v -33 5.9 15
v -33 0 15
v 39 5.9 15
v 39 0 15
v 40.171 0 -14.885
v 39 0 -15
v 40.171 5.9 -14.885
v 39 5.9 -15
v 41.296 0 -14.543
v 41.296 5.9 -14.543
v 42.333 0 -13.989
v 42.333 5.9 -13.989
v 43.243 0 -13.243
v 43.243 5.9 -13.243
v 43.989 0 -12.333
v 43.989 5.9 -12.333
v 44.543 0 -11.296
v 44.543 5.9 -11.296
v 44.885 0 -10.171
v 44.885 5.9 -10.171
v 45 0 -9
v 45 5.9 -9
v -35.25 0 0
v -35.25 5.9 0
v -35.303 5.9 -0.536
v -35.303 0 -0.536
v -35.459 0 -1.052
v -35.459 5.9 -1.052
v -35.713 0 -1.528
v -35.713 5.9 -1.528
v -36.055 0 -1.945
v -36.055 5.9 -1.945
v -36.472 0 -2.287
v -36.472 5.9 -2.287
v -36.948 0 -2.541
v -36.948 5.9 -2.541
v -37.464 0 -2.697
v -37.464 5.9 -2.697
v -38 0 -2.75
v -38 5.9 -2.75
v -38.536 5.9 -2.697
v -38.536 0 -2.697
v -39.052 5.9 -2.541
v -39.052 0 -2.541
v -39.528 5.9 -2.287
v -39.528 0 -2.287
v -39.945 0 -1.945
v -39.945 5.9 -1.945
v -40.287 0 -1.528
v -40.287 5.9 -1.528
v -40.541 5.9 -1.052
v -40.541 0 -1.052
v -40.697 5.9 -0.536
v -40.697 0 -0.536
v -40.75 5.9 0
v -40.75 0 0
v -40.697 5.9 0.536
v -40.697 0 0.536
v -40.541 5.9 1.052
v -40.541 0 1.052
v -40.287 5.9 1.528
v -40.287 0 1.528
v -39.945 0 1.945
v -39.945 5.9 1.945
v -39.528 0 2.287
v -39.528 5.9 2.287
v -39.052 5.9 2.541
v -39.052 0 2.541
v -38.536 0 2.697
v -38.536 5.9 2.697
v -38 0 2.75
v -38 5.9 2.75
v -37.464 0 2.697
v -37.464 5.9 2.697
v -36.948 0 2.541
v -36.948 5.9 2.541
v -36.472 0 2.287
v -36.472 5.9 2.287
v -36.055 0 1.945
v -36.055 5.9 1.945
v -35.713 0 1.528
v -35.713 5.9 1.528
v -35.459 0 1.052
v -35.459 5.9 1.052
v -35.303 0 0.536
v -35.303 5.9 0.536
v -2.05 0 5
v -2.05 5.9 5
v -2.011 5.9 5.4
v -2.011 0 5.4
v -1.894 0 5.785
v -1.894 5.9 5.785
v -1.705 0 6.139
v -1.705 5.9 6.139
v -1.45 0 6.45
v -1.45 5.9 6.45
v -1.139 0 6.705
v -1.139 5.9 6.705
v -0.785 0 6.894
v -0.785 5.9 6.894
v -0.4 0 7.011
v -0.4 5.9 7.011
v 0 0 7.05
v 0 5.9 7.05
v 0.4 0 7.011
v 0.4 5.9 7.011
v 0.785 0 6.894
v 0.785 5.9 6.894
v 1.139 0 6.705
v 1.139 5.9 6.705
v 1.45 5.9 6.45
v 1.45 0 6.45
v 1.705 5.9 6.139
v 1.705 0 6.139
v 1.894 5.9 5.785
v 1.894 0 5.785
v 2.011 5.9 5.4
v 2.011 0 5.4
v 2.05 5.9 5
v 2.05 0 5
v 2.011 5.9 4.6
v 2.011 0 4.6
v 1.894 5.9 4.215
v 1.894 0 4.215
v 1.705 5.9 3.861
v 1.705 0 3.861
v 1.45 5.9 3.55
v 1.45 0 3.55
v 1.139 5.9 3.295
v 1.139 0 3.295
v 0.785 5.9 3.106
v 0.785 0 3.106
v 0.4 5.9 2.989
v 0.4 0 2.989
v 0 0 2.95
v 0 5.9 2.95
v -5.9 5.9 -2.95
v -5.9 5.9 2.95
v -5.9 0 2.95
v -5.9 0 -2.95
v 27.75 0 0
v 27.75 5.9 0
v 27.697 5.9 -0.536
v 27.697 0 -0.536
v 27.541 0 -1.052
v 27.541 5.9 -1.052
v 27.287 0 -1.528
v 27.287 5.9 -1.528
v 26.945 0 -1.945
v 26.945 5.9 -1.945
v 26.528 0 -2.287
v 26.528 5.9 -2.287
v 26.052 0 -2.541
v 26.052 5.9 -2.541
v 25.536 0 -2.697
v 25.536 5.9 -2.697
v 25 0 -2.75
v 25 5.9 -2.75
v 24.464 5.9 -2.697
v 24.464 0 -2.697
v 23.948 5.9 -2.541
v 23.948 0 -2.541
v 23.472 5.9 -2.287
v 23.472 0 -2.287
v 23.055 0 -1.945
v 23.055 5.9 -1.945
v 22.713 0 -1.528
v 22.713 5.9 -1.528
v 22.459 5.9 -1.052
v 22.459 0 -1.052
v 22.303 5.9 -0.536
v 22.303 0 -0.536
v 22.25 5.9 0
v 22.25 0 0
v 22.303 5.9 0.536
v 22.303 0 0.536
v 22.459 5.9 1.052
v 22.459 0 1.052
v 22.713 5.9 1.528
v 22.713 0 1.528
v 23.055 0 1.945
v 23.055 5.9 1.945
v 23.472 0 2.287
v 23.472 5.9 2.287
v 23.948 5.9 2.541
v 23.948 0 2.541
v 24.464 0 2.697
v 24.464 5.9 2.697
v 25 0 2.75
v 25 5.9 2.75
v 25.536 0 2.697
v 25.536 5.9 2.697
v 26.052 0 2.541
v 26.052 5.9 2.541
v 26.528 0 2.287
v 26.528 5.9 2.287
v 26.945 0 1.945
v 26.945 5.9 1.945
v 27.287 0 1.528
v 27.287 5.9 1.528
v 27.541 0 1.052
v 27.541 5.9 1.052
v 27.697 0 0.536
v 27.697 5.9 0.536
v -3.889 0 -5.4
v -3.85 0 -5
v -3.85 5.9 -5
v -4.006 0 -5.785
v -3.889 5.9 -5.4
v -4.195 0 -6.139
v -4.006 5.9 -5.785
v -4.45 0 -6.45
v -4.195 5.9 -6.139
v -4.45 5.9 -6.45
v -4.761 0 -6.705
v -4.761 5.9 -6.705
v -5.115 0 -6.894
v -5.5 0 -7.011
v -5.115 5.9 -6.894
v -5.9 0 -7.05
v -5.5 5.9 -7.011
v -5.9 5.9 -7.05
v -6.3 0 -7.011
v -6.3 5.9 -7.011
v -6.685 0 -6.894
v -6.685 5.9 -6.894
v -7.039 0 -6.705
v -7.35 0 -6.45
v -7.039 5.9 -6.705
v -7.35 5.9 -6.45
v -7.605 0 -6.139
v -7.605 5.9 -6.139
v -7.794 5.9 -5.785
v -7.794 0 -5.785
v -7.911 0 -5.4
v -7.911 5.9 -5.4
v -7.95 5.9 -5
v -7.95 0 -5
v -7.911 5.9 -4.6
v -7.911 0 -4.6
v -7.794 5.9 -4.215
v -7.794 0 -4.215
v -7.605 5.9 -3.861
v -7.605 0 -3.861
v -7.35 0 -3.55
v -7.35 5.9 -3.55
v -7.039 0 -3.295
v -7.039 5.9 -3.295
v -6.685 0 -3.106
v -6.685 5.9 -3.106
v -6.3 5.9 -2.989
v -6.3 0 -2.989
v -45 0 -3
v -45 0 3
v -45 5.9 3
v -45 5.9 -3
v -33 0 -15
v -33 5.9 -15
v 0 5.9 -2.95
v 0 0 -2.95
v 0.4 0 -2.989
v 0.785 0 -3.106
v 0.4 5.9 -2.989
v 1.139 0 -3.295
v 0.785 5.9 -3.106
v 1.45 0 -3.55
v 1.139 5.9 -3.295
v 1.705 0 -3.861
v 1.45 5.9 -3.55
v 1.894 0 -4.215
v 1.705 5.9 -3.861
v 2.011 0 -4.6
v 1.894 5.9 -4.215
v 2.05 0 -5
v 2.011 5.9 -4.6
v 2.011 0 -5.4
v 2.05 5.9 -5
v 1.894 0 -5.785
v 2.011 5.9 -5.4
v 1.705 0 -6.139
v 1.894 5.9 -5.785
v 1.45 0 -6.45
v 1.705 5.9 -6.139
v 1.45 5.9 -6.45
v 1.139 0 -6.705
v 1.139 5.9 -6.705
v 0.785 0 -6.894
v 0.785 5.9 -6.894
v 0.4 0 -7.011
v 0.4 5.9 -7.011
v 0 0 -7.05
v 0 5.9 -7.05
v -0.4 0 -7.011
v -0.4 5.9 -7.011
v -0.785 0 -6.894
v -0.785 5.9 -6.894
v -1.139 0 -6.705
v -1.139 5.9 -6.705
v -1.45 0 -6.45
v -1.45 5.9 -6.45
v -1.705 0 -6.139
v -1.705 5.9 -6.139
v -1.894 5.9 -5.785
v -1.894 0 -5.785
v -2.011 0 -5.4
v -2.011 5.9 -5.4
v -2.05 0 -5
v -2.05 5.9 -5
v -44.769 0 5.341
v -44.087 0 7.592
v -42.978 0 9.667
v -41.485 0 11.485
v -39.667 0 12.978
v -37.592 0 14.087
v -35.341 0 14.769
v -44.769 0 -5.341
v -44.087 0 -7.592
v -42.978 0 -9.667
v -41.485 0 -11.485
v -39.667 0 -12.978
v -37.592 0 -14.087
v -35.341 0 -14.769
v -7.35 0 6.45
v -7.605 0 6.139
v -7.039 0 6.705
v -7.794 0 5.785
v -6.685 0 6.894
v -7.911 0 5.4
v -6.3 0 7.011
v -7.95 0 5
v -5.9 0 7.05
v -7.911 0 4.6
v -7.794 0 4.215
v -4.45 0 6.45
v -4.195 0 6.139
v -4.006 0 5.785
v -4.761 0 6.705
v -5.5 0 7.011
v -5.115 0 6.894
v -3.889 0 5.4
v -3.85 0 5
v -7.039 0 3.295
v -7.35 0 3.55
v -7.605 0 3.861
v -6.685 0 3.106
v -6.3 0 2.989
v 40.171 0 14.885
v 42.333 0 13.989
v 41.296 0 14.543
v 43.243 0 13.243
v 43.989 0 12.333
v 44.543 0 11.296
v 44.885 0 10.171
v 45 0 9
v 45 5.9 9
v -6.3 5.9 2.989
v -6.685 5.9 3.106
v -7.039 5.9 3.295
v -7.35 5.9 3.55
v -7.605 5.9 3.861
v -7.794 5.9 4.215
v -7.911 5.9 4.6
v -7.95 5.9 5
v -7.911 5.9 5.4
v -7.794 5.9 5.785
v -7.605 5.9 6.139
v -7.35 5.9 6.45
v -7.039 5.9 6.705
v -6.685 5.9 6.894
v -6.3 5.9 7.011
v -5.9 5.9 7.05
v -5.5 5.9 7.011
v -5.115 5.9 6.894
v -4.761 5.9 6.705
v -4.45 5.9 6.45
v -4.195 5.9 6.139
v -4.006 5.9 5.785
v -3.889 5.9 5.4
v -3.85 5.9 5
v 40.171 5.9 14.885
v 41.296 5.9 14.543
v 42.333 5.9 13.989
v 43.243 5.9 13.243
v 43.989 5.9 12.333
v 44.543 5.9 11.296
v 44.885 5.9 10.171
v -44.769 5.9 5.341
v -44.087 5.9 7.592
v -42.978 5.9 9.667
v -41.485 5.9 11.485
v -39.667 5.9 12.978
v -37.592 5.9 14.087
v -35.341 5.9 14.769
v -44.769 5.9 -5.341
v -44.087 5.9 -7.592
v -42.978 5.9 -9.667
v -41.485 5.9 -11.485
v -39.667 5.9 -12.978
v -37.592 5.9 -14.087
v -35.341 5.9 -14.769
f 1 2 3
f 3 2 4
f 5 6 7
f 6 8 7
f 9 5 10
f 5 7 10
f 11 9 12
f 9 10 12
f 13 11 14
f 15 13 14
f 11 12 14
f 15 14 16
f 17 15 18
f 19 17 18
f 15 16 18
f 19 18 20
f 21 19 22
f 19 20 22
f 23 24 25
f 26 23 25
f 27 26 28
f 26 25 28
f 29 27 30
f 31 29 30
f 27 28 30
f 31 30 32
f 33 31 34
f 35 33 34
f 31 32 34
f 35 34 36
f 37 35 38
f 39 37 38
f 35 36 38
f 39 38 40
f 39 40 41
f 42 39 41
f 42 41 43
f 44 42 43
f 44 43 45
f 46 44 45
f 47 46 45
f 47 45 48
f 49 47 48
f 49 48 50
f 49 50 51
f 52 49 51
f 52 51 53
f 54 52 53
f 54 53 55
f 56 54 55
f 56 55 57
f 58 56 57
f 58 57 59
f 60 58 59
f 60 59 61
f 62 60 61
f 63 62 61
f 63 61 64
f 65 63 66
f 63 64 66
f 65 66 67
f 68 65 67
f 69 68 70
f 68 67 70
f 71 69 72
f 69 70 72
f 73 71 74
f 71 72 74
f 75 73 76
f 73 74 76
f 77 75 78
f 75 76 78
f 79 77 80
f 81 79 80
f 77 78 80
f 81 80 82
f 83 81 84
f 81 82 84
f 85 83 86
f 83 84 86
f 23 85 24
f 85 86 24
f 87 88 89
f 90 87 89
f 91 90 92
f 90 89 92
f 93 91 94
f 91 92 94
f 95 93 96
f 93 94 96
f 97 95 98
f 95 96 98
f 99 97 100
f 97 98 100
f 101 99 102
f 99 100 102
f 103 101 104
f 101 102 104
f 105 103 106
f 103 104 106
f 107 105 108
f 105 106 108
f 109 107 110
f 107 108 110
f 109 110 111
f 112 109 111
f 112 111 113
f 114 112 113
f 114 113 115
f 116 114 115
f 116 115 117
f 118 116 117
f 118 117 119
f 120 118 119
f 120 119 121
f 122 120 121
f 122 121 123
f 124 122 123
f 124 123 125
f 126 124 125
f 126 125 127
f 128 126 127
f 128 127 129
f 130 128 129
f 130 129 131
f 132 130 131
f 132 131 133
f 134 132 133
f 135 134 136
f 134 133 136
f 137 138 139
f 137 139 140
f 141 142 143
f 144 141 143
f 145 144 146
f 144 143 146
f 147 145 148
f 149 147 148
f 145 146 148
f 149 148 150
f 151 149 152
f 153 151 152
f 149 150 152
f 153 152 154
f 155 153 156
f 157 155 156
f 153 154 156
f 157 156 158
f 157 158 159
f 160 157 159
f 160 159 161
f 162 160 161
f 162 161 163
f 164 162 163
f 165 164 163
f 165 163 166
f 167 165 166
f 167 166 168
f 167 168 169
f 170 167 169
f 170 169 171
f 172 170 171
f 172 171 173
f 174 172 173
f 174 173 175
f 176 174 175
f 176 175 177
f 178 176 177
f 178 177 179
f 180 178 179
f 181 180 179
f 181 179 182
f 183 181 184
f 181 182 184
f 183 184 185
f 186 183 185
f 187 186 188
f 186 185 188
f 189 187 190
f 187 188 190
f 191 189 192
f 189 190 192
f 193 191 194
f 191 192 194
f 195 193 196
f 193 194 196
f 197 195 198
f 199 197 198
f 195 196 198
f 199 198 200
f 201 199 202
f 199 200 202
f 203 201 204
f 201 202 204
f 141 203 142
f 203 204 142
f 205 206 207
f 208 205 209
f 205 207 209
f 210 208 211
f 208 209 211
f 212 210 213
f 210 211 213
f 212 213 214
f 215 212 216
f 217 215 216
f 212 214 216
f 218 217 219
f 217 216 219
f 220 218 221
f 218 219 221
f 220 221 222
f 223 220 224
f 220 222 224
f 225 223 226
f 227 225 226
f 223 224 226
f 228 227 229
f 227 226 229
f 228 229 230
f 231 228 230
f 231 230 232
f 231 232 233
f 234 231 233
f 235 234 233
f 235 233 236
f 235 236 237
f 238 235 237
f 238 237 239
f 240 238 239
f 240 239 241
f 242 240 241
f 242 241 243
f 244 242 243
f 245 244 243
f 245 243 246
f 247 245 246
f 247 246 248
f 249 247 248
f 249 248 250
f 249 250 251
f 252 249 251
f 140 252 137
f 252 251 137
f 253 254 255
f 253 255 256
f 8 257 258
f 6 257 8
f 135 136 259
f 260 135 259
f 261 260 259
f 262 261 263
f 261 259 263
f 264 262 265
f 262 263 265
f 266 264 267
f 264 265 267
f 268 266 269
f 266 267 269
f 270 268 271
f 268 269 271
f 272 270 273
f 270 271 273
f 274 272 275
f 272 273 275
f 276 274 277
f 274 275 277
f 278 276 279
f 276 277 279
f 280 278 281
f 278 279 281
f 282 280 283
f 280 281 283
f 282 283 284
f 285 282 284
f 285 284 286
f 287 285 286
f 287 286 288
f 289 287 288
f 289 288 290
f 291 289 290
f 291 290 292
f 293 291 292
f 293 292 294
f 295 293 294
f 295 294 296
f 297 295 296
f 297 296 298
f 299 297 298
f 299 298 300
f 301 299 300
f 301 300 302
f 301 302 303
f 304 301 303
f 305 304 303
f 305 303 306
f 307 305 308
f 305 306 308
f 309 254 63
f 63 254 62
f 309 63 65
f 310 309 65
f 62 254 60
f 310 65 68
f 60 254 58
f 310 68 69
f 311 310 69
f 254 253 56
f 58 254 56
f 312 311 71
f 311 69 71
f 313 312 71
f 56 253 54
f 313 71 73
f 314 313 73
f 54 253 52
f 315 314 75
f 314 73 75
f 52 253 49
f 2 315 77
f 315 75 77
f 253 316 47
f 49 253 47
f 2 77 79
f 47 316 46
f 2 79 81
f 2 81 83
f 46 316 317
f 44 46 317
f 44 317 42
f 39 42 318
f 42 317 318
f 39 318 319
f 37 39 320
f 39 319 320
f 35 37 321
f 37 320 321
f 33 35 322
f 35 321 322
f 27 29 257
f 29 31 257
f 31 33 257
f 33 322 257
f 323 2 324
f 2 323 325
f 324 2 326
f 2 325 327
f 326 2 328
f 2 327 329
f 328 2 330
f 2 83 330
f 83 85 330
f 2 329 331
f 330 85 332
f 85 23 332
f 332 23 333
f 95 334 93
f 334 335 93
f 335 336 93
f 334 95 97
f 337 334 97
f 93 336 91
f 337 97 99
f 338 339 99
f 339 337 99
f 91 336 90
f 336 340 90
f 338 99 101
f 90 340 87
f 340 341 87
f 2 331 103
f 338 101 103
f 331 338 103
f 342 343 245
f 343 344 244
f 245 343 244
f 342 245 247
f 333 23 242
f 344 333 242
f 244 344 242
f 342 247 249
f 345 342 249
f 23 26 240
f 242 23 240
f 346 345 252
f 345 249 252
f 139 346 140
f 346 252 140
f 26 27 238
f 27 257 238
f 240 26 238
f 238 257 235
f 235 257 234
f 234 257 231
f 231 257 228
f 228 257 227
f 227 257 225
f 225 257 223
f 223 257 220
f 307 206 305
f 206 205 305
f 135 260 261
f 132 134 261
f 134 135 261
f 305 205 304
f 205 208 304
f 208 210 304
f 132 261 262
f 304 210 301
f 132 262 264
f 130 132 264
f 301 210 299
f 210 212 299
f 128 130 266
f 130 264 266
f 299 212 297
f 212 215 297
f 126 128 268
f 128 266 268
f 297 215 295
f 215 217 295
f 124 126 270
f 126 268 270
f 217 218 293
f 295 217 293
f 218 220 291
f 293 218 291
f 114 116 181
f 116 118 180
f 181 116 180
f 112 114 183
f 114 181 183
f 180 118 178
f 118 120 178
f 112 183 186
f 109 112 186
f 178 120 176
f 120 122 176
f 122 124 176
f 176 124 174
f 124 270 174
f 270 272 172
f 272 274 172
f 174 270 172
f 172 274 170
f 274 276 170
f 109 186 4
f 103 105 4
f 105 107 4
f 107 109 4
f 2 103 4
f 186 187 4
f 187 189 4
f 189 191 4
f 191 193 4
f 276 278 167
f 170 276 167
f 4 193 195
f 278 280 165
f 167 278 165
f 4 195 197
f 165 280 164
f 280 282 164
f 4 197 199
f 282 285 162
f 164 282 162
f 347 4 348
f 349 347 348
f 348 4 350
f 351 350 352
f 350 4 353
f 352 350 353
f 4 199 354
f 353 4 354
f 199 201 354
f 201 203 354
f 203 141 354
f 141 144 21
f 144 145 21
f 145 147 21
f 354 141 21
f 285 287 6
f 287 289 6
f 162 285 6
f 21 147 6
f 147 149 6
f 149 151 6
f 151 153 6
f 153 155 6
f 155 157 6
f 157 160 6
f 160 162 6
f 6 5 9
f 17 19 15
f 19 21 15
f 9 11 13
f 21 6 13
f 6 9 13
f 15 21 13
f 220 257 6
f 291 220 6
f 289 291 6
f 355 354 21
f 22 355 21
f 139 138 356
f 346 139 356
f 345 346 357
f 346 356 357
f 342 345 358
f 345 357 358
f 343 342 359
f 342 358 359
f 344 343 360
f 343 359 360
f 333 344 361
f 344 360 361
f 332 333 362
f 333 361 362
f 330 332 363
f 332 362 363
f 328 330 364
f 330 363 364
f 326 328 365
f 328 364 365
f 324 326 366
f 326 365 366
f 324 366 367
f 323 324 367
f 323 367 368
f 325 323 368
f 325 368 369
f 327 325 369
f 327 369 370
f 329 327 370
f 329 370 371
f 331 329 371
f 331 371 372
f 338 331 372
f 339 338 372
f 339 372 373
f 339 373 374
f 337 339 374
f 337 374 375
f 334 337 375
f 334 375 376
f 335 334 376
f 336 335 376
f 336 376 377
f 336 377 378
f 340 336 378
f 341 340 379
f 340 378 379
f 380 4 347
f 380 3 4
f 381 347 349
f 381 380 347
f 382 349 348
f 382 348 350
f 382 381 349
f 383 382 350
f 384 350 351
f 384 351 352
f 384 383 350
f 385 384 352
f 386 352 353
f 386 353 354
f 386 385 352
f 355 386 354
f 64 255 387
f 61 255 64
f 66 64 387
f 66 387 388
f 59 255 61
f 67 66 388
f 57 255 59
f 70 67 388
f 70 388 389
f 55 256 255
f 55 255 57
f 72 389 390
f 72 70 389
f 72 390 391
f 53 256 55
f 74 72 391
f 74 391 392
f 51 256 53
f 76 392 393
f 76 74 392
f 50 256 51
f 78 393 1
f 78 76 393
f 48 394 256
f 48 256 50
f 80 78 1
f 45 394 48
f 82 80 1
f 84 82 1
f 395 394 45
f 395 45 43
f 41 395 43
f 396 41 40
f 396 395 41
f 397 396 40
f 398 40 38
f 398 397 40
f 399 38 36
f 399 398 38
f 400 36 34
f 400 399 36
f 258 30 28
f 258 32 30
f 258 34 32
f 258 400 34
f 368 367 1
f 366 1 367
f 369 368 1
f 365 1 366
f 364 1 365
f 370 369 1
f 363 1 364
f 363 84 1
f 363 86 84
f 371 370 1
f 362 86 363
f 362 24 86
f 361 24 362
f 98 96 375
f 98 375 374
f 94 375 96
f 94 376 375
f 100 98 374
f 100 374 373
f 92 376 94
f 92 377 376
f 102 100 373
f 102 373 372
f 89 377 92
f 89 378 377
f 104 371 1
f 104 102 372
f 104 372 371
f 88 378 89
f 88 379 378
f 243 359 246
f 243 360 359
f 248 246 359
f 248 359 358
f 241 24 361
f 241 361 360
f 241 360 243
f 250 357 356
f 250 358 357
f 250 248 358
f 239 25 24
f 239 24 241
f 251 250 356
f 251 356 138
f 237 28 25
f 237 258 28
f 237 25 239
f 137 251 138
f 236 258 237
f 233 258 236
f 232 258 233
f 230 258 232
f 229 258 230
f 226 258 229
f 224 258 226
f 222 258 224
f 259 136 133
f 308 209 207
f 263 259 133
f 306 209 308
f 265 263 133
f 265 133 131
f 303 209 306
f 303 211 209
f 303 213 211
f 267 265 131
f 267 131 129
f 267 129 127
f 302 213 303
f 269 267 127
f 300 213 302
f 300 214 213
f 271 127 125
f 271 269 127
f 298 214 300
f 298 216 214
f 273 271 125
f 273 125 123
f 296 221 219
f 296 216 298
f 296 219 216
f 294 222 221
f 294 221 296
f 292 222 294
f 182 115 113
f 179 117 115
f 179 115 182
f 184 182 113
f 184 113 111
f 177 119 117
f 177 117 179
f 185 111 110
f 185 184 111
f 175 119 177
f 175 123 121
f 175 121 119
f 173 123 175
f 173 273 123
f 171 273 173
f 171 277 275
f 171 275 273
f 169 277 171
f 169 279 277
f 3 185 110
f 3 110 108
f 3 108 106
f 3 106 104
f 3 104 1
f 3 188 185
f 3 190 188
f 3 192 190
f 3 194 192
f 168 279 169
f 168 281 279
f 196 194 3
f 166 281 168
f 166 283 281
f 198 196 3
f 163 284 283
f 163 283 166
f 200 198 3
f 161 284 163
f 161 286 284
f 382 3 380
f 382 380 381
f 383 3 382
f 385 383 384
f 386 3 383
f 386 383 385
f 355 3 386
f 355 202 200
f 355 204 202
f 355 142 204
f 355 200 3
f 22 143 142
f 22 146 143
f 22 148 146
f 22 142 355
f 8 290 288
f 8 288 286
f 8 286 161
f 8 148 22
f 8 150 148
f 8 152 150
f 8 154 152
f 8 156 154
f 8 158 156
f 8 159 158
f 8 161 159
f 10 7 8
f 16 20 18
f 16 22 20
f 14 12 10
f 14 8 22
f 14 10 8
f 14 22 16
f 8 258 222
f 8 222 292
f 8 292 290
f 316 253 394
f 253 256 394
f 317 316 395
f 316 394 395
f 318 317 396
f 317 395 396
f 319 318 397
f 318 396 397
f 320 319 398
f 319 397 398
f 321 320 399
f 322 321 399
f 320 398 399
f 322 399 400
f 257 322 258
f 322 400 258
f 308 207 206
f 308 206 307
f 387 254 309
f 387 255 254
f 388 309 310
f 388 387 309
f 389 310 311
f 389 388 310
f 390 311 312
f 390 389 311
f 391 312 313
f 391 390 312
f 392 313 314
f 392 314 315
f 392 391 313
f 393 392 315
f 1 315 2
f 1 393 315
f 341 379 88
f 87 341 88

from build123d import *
from OCP.BRepFilletAPI import BRepFilletAPI_MakeFillet

# Parameters (mm, degrees)
SKETCH1_W           = 90
SKETCH1_H           = 30
BOSS_EXTRUDE1_DEPTH = 5.9
SKETCH2_R           = 2.75
CUT_EXTRUDE1_DEPTH  = 10
SKETCH3_W           = 5.9
SKETCH3_H           = 10
CUT_EXTRUDE2_DEPTH  = 10
CUT_EXTRUDE5_REACH  = 49.8
SKETCH6_R           = 2.05
FILLET1_R1          = 12
FILLET1_R2          = 6


with BuildPart() as part:
    # Sketch1 → Boss-Extrude1 (new body)
    with BuildSketch(Plane(origin=(0, 0, 0), x_dir=(1, 0, 0), z_dir=(0, 1, 0))):
        Rectangle(SKETCH1_W, SKETCH1_H)
    extrude(amount=BOSS_EXTRUDE1_DEPTH)

    # Sketch2 → Cut-Extrude1 (cut)
    with BuildSketch(Plane(origin=(0, 5.9, 0), x_dir=(1, 0, 0), z_dir=(0, 1, 0))):
        with Locations((25, 0)):
            Circle(SKETCH2_R)
        with Locations((-38, 0)):
            Circle(SKETCH2_R)
    extrude(amount=-CUT_EXTRUDE1_DEPTH, mode=Mode.SUBTRACT)

    # Sketch3 → Cut-Extrude2 (cut)
    with BuildSketch(Plane(origin=(0, 5.9, 0), x_dir=(1, 0, 0), z_dir=(0, 1, 0))):
        with Locations((-2.95, 0)):
            Rectangle(SKETCH3_W, SKETCH3_H)
    extrude(amount=-CUT_EXTRUDE2_DEPTH, mode=Mode.SUBTRACT)

    # Sketch6 → Cut-Extrude5 (cut, up to next)
    with BuildSketch(Plane(origin=(0, 5.9, 0), x_dir=(1, 0, 0), z_dir=(0, 1, 0)), mode=Mode.PRIVATE) as cut_extrude5_sk1:
        with Locations((0, 5)):
            Circle(SKETCH6_R)
    cut_extrude5_tool1 = extrude(cut_extrude5_sk1.sketch, amount=-CUT_EXTRUDE5_REACH, mode=Mode.PRIVATE) & part.part
    # Sketch6 → Cut-Extrude5 (cut, up to next)
    with BuildSketch(Plane(origin=(0, 5.9, 0), x_dir=(1, 0, 0), z_dir=(0, 1, 0)), mode=Mode.PRIVATE) as cut_extrude5_sk2:
        with Locations((-5.9, 5)):
            Circle(SKETCH6_R)
    cut_extrude5_tool2 = extrude(cut_extrude5_sk2.sketch, amount=-CUT_EXTRUDE5_REACH, mode=Mode.PRIVATE) & part.part
    # Sketch6 → Cut-Extrude5 (cut, up to next)
    with BuildSketch(Plane(origin=(0, 5.9, 0), x_dir=(1, 0, 0), z_dir=(0, 1, 0)), mode=Mode.PRIVATE) as cut_extrude5_sk3:
        with Locations((0, -5)):
            Circle(SKETCH6_R)
    cut_extrude5_tool3 = extrude(cut_extrude5_sk3.sketch, amount=-CUT_EXTRUDE5_REACH, mode=Mode.PRIVATE) & part.part
    # Sketch6 → Cut-Extrude5 (cut, up to next)
    with BuildSketch(Plane(origin=(0, 5.9, 0), x_dir=(1, 0, 0), z_dir=(0, 1, 0)), mode=Mode.PRIVATE) as cut_extrude5_sk4:
        with Locations((-5.9, -5)):
            Circle(SKETCH6_R)
    cut_extrude5_tool4 = extrude(cut_extrude5_sk4.sketch, amount=-CUT_EXTRUDE5_REACH, mode=Mode.PRIVATE) & part.part
    add(cut_extrude5_tool1.solids().sort_by_distance((0, 5.9, -5))[0], mode=Mode.SUBTRACT)
    add(cut_extrude5_tool2.solids().sort_by_distance((-5.9, 5.9, -5))[0], mode=Mode.SUBTRACT)
    add(cut_extrude5_tool3.solids().sort_by_distance((0, 5.9, 5))[0], mode=Mode.SUBTRACT)
    add(cut_extrude5_tool4.solids().sort_by_distance((-5.9, 5.9, 5))[0], mode=Mode.SUBTRACT)

    # Fillet1: one fillet with a radius per group of edges: ONE call of the kernel's fillet builder (fillet() takes one radius for all edges)
    fillet1_edges_1 = [part.edges().sort_by_distance(p)[0] for p in [
        (-45, 2.95, -15),
        (-45, 2.95, 15),
    ]]
    fillet1_edges_2 = [part.edges().sort_by_distance(p)[0] for p in [
        (45, 2.95, 15),
        (45, 2.95, -15),
    ]]
    fillet1 = BRepFilletAPI_MakeFillet(part.part.solid().wrapped)
    for e in fillet1_edges_1:
        fillet1.Add(FILLET1_R1, e.wrapped)
    for e in fillet1_edges_2:
        fillet1.Add(FILLET1_R2, e.wrapped)
    add(Compound.cast(fillet1.Shape()), mode=Mode.REPLACE)


solid = part.part
